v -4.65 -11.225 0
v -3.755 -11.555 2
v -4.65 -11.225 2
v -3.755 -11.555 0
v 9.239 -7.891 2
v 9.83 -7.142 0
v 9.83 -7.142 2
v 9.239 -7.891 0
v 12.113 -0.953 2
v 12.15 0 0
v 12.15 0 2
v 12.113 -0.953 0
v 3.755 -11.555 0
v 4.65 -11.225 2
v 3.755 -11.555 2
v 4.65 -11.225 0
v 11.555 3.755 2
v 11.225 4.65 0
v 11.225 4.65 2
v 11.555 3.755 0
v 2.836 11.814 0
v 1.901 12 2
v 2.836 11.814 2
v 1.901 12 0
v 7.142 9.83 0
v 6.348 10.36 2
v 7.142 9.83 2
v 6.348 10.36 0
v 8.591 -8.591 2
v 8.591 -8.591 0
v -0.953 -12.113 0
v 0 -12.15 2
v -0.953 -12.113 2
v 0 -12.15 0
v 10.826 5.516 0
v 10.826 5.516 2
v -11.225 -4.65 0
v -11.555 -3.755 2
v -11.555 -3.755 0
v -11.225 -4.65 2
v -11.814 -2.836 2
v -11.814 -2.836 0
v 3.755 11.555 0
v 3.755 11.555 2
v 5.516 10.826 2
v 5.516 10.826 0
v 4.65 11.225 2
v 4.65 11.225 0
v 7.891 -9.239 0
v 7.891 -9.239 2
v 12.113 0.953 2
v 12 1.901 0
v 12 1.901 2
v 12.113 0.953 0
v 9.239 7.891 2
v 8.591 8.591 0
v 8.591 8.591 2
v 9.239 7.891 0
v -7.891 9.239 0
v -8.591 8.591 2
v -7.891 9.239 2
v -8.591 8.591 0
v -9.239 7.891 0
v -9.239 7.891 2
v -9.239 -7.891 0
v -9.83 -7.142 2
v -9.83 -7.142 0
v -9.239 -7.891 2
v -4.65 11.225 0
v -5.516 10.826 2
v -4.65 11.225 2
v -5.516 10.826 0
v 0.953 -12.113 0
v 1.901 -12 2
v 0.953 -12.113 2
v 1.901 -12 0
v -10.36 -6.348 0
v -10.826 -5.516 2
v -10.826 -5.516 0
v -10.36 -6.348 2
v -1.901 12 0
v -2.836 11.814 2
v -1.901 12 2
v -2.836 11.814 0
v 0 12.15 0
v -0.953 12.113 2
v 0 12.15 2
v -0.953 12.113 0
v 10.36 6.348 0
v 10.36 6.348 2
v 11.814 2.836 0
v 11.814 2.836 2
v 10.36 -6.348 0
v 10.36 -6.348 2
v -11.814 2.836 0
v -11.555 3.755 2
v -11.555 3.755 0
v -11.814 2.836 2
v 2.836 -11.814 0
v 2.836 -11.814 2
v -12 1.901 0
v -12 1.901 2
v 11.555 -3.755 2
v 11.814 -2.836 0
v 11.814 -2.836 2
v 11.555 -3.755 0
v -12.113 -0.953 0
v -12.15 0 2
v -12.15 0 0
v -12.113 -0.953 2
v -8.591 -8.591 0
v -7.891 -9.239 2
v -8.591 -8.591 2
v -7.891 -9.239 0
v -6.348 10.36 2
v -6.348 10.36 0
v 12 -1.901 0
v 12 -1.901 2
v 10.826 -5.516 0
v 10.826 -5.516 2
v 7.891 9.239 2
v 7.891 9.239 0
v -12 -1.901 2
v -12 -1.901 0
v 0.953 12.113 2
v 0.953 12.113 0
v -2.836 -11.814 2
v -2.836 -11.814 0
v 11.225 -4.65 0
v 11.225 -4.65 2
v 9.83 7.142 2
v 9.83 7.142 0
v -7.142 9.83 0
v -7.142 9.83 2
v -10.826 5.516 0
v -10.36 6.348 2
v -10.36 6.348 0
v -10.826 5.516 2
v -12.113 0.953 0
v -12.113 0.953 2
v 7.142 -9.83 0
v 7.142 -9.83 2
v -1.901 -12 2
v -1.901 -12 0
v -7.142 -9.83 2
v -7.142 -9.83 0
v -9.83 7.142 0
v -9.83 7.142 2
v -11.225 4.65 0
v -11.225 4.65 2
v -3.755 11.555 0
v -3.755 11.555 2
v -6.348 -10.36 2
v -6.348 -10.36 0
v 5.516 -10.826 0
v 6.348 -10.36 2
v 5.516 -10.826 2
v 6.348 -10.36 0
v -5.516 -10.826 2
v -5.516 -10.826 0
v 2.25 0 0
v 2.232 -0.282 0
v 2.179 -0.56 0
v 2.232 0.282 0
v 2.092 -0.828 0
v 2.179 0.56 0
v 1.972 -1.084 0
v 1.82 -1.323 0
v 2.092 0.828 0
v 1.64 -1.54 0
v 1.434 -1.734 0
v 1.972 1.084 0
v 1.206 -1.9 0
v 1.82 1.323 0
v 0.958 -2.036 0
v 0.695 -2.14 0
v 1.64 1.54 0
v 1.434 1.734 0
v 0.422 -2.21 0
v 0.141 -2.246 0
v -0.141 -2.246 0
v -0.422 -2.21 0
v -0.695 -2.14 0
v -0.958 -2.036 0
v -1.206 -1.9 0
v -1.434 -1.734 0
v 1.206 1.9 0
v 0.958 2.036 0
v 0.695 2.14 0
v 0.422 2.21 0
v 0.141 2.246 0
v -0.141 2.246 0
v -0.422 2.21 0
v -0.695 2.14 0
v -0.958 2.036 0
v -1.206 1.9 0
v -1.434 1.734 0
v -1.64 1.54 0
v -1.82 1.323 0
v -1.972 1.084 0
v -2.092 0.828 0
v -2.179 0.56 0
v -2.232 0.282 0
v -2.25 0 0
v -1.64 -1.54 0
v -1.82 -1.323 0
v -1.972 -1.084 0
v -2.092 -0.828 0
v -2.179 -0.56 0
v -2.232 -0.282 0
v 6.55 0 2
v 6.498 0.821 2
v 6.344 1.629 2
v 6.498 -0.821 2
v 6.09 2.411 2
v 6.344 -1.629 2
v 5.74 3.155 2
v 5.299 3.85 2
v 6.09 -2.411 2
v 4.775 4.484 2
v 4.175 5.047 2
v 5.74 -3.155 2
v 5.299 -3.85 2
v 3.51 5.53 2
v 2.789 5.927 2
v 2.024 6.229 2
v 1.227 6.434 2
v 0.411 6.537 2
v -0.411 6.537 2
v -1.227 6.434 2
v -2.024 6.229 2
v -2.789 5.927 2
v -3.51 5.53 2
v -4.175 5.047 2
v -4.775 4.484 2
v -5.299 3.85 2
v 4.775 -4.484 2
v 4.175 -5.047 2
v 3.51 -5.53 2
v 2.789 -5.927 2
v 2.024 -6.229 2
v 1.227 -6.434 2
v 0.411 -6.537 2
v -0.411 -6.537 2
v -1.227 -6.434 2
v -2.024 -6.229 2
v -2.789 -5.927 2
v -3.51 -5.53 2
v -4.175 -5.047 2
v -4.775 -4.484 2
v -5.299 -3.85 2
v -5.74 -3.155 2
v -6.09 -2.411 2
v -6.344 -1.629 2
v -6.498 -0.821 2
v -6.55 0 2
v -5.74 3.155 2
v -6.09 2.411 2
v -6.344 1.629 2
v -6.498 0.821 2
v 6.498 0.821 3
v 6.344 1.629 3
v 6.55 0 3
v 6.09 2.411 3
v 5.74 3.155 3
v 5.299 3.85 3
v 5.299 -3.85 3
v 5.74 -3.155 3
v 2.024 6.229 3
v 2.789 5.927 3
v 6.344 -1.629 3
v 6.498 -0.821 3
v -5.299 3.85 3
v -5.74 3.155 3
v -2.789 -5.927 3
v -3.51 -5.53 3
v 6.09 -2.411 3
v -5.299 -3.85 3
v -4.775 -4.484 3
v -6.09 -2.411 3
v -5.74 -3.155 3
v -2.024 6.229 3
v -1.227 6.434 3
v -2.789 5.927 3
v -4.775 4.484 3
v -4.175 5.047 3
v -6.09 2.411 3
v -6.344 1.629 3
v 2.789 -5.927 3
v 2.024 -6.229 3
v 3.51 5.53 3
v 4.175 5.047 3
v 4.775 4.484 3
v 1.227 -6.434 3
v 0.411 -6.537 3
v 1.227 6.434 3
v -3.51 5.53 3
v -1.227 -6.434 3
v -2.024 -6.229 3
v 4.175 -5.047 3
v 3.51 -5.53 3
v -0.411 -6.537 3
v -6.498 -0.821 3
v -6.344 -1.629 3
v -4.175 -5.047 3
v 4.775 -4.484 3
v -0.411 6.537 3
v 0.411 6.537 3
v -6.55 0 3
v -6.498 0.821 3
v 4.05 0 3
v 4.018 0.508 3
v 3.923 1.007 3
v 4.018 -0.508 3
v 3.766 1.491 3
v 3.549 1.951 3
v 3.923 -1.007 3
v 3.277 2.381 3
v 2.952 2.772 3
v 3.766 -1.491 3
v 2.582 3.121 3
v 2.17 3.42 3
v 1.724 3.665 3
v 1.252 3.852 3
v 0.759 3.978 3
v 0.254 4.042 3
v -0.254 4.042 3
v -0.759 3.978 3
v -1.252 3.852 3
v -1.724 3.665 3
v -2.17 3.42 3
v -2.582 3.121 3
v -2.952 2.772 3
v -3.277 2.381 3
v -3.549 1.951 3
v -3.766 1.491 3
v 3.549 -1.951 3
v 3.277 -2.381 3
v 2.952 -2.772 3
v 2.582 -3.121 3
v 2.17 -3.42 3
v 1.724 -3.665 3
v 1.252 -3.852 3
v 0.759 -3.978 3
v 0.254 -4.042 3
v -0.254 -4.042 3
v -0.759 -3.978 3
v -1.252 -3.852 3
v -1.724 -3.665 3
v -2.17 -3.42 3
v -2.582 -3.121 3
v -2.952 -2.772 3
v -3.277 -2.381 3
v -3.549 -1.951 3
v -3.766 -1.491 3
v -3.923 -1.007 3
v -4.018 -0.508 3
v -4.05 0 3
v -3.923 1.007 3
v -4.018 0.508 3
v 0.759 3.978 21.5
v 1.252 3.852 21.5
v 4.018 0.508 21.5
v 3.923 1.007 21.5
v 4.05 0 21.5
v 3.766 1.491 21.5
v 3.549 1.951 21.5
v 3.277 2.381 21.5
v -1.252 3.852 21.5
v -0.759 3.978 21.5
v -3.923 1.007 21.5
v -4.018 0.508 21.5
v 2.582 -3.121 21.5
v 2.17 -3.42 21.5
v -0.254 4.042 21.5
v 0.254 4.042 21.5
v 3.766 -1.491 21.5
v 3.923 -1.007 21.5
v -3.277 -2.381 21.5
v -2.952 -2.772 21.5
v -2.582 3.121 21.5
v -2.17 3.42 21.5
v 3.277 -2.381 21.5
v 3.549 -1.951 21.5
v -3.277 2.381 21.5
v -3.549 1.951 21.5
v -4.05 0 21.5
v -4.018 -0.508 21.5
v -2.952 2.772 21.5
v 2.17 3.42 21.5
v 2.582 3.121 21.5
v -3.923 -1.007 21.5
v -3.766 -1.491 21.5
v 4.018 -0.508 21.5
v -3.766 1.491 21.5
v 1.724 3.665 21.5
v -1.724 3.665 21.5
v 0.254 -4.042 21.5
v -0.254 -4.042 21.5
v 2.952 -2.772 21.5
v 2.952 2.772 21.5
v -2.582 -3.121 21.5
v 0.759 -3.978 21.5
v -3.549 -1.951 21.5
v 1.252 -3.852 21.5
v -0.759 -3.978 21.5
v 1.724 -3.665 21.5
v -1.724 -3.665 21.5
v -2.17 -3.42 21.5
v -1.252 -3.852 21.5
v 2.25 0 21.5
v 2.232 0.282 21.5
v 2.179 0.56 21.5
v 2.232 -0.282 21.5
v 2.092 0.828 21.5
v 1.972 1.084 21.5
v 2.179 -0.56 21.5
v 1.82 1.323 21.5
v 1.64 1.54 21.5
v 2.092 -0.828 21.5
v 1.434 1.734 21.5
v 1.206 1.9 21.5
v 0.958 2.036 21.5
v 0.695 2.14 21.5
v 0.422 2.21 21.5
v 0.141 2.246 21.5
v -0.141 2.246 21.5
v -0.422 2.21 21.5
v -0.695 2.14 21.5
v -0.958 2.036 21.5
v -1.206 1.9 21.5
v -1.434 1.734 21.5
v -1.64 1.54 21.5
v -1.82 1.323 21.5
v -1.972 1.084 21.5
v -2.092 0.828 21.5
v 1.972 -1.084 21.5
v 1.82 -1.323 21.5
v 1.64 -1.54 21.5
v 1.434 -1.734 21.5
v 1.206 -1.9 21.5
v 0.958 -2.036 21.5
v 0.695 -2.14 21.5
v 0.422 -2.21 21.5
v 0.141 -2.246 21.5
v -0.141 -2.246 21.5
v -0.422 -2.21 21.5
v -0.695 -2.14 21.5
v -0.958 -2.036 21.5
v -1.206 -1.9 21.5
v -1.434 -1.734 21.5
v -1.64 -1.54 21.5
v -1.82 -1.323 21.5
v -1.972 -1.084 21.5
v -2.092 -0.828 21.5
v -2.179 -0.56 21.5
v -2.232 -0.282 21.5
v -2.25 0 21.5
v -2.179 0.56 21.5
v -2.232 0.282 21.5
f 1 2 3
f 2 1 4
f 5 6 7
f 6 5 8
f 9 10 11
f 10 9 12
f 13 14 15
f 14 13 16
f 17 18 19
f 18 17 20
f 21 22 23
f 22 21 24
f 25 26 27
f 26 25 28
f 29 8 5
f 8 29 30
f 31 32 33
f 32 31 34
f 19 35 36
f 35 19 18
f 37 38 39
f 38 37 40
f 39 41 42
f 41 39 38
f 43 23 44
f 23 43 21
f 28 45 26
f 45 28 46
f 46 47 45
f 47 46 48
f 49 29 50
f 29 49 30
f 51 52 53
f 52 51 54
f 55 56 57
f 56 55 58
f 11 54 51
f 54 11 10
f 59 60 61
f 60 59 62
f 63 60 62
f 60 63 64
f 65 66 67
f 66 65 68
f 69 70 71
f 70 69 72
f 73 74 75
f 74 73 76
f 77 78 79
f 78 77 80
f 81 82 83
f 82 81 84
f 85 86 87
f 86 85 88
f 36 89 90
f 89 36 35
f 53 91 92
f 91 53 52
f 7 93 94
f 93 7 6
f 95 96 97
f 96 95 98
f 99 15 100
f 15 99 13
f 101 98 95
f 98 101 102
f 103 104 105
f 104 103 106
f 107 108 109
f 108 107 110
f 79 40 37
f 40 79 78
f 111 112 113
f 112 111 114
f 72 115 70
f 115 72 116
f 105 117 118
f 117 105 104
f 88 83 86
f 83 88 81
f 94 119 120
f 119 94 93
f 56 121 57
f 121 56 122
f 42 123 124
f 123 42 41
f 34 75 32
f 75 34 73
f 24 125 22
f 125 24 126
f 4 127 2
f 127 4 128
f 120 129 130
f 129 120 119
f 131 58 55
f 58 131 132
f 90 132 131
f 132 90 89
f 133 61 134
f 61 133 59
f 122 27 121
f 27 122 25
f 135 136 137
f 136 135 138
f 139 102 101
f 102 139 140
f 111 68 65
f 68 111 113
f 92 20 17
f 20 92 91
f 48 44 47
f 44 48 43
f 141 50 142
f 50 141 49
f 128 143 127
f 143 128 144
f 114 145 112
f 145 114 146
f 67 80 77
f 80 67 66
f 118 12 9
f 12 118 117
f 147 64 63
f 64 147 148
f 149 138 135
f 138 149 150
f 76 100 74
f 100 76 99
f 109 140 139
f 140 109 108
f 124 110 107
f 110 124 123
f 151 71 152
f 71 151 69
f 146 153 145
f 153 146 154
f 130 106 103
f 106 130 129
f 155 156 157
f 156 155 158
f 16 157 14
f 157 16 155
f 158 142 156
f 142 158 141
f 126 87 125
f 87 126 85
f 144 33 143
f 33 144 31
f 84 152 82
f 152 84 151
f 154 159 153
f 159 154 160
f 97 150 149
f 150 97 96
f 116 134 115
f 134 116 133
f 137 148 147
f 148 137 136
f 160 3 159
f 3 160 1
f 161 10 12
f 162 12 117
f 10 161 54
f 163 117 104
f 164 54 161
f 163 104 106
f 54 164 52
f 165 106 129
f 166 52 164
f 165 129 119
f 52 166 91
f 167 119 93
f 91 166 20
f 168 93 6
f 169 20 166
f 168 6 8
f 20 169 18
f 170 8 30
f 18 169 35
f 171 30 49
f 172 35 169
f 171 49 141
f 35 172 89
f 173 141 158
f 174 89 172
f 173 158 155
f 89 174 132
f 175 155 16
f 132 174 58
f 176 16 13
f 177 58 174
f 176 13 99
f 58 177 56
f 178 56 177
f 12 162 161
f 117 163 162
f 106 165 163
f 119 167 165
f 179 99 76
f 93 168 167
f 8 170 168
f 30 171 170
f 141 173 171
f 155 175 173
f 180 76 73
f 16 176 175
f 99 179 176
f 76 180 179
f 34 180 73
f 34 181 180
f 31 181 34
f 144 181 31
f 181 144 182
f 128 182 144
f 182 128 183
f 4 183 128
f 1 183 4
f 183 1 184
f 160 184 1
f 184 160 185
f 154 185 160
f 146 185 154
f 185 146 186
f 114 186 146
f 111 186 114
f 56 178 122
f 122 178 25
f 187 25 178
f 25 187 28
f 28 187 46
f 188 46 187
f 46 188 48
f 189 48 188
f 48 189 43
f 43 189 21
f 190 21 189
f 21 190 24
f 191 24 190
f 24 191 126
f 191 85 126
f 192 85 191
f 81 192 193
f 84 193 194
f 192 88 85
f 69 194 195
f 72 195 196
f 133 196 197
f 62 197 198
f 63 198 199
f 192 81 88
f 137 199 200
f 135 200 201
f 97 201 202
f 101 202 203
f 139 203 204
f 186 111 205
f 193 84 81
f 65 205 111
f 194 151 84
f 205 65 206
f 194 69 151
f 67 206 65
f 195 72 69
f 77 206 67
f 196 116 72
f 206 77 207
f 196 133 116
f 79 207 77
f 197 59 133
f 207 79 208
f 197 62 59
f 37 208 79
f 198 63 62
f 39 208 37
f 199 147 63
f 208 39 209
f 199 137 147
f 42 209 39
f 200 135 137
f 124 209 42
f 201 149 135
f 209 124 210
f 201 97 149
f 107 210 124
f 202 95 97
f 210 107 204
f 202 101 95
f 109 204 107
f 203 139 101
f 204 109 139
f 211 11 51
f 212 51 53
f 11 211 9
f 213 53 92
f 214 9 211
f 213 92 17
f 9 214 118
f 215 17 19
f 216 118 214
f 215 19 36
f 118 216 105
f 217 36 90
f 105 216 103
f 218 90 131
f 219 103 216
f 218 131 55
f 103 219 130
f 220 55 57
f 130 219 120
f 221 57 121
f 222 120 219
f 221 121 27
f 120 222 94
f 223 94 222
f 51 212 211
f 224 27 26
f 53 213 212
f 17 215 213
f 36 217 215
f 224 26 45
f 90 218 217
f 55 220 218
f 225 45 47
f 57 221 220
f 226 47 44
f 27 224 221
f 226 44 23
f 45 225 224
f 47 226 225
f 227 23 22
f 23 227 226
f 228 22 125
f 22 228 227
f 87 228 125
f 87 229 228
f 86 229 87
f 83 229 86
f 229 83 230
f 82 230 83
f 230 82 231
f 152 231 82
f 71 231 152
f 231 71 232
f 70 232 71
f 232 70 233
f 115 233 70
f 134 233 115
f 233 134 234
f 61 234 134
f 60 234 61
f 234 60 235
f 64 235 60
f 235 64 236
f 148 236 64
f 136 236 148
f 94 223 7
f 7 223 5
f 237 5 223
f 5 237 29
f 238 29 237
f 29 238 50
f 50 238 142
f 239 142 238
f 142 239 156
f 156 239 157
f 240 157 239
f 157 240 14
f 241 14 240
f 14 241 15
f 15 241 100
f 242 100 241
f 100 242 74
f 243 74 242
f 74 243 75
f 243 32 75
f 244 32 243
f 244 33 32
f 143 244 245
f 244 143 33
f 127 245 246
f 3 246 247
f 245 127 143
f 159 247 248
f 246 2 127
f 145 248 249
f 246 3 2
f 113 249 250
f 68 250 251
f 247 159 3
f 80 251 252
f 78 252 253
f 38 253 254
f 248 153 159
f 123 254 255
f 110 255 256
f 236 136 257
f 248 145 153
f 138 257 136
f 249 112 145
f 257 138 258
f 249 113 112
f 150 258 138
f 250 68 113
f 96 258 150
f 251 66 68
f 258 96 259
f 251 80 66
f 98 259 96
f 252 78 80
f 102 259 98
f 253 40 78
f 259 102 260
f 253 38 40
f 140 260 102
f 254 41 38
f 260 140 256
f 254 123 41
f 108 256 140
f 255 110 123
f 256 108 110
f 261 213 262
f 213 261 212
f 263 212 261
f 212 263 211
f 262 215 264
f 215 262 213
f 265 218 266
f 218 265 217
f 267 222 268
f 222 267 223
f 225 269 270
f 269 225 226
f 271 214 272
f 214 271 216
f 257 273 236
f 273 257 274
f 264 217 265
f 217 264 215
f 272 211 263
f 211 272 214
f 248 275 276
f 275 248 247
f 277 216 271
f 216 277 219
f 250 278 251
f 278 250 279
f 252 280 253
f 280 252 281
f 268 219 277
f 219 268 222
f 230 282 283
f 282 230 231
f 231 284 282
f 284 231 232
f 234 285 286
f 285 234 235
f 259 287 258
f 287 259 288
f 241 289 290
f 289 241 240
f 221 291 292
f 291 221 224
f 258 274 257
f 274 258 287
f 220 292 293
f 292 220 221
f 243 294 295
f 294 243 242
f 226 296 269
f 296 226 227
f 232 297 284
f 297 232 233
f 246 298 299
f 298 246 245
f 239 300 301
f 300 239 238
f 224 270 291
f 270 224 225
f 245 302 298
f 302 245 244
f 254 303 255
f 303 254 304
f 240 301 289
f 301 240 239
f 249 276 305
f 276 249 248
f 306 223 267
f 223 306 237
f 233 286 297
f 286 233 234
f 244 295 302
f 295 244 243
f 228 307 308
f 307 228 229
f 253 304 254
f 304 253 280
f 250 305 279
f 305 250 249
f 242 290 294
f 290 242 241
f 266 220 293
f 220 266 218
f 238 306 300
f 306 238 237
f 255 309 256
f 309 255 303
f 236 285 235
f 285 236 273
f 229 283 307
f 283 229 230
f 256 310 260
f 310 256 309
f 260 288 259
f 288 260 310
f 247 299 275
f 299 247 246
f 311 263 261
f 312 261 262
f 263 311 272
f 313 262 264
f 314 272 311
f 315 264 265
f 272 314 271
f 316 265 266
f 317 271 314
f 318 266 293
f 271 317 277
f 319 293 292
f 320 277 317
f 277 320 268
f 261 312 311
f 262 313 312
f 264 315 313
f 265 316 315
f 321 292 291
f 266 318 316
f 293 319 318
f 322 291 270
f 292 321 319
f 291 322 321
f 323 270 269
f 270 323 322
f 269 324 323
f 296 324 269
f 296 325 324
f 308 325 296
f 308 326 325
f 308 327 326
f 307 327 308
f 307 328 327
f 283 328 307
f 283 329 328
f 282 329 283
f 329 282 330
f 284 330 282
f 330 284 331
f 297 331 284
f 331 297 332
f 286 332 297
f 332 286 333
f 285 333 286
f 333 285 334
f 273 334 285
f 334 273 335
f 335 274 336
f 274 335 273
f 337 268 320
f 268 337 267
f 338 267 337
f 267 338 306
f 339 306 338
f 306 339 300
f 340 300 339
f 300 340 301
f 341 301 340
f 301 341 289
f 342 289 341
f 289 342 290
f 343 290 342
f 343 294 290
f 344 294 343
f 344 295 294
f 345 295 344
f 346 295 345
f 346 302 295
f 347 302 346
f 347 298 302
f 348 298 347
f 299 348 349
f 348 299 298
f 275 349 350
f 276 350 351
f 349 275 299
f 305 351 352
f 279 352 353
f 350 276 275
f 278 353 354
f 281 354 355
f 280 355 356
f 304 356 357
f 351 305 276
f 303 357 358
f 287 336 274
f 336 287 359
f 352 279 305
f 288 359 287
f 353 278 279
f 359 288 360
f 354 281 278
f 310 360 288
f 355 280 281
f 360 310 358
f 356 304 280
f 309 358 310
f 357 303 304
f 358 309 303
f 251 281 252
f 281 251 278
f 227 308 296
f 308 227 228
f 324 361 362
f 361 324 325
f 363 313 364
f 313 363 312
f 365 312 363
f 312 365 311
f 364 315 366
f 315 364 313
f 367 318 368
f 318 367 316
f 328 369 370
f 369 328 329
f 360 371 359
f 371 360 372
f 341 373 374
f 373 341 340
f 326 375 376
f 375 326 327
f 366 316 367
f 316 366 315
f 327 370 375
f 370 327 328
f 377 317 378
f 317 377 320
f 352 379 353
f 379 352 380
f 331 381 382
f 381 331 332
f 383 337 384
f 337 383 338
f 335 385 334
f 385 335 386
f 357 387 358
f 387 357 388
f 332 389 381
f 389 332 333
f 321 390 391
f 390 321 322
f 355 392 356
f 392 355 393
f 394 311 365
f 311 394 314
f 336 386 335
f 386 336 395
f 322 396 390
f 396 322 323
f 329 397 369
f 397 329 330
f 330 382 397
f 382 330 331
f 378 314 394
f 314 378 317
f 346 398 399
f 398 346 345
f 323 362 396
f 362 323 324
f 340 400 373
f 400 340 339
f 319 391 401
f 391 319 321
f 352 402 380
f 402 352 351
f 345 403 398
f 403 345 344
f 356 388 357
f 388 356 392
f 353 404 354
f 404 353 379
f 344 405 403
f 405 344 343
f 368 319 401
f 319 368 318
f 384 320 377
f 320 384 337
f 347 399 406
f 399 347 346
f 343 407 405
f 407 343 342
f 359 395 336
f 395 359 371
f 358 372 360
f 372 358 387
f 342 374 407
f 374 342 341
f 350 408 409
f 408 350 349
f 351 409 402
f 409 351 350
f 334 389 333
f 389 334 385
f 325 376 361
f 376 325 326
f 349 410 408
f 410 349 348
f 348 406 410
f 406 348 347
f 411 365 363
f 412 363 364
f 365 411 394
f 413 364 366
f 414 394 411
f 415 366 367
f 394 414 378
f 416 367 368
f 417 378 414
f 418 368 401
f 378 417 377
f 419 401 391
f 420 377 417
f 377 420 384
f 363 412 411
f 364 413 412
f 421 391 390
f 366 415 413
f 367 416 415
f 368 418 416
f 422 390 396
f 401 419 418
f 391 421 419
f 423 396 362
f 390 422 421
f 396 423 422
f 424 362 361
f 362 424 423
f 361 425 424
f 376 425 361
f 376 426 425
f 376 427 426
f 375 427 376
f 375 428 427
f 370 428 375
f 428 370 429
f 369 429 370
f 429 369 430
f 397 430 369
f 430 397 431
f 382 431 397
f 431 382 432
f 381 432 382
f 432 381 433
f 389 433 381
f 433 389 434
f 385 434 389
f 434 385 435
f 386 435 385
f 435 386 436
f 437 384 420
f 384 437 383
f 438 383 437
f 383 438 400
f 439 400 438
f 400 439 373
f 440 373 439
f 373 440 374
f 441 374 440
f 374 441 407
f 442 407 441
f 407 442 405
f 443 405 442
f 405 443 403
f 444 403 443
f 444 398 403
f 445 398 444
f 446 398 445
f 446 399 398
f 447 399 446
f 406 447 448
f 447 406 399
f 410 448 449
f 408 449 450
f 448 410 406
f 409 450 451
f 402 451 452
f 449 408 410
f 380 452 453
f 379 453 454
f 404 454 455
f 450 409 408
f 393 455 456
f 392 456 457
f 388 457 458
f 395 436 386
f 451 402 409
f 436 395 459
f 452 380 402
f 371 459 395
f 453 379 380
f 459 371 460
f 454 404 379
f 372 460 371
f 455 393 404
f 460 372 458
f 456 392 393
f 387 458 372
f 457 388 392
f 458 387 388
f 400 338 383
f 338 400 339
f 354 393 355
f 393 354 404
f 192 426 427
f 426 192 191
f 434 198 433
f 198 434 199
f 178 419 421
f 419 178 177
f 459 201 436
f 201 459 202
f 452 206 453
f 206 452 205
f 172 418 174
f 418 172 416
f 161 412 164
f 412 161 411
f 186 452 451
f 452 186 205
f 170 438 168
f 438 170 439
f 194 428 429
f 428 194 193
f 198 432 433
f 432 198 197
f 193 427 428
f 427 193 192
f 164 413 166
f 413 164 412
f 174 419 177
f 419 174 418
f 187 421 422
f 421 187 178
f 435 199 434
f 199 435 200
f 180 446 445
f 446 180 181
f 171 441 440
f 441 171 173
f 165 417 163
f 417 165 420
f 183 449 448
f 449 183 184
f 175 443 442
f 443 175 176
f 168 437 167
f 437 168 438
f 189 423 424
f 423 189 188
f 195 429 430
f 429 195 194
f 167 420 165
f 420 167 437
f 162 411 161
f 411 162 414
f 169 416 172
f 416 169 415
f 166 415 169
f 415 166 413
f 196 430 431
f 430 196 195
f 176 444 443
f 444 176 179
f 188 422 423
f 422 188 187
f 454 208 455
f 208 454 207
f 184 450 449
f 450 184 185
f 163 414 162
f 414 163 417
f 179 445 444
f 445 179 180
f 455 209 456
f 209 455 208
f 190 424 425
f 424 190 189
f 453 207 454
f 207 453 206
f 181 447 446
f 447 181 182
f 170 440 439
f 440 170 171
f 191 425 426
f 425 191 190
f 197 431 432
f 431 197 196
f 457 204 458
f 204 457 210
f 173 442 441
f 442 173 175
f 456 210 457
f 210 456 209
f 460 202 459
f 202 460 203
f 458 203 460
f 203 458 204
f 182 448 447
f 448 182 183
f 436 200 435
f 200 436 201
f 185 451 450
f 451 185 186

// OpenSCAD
//valec k disku do mechoveho kola

include <../parameters.scad>

cylinder_1_thickness = 2;
cylinder_1_diameter = 608_bearing_outer_diameter+2;
cylinder_2_thickness = 3;
cylinder_2_diameter = 608_bearing_inner_diameter+5;

module 888_2012 () {
    difference() {
        union() {
            cylinder(h=cylinder_1_thickness, d=cylinder_1_diameter, $fn=80);
            cylinder(h=cylinder_2_thickness, d=cylinder_2_diameter, $fn=50);
            cylinder(h=wheel_inner_thickness/2+wheel_disc_upper_thickness+cylinder_1_thickness+(cylinder_2_thickness-cylinder_1_thickness) - global_clearance,
                  d=608_bearing_inner_diameter, $fn=50);
        }
        translate([0,0,-1])
            cylinder(h=wheel_inner_thickness, d=M4_screw_diameter, $fn=50);
    }
}

888_2012();
